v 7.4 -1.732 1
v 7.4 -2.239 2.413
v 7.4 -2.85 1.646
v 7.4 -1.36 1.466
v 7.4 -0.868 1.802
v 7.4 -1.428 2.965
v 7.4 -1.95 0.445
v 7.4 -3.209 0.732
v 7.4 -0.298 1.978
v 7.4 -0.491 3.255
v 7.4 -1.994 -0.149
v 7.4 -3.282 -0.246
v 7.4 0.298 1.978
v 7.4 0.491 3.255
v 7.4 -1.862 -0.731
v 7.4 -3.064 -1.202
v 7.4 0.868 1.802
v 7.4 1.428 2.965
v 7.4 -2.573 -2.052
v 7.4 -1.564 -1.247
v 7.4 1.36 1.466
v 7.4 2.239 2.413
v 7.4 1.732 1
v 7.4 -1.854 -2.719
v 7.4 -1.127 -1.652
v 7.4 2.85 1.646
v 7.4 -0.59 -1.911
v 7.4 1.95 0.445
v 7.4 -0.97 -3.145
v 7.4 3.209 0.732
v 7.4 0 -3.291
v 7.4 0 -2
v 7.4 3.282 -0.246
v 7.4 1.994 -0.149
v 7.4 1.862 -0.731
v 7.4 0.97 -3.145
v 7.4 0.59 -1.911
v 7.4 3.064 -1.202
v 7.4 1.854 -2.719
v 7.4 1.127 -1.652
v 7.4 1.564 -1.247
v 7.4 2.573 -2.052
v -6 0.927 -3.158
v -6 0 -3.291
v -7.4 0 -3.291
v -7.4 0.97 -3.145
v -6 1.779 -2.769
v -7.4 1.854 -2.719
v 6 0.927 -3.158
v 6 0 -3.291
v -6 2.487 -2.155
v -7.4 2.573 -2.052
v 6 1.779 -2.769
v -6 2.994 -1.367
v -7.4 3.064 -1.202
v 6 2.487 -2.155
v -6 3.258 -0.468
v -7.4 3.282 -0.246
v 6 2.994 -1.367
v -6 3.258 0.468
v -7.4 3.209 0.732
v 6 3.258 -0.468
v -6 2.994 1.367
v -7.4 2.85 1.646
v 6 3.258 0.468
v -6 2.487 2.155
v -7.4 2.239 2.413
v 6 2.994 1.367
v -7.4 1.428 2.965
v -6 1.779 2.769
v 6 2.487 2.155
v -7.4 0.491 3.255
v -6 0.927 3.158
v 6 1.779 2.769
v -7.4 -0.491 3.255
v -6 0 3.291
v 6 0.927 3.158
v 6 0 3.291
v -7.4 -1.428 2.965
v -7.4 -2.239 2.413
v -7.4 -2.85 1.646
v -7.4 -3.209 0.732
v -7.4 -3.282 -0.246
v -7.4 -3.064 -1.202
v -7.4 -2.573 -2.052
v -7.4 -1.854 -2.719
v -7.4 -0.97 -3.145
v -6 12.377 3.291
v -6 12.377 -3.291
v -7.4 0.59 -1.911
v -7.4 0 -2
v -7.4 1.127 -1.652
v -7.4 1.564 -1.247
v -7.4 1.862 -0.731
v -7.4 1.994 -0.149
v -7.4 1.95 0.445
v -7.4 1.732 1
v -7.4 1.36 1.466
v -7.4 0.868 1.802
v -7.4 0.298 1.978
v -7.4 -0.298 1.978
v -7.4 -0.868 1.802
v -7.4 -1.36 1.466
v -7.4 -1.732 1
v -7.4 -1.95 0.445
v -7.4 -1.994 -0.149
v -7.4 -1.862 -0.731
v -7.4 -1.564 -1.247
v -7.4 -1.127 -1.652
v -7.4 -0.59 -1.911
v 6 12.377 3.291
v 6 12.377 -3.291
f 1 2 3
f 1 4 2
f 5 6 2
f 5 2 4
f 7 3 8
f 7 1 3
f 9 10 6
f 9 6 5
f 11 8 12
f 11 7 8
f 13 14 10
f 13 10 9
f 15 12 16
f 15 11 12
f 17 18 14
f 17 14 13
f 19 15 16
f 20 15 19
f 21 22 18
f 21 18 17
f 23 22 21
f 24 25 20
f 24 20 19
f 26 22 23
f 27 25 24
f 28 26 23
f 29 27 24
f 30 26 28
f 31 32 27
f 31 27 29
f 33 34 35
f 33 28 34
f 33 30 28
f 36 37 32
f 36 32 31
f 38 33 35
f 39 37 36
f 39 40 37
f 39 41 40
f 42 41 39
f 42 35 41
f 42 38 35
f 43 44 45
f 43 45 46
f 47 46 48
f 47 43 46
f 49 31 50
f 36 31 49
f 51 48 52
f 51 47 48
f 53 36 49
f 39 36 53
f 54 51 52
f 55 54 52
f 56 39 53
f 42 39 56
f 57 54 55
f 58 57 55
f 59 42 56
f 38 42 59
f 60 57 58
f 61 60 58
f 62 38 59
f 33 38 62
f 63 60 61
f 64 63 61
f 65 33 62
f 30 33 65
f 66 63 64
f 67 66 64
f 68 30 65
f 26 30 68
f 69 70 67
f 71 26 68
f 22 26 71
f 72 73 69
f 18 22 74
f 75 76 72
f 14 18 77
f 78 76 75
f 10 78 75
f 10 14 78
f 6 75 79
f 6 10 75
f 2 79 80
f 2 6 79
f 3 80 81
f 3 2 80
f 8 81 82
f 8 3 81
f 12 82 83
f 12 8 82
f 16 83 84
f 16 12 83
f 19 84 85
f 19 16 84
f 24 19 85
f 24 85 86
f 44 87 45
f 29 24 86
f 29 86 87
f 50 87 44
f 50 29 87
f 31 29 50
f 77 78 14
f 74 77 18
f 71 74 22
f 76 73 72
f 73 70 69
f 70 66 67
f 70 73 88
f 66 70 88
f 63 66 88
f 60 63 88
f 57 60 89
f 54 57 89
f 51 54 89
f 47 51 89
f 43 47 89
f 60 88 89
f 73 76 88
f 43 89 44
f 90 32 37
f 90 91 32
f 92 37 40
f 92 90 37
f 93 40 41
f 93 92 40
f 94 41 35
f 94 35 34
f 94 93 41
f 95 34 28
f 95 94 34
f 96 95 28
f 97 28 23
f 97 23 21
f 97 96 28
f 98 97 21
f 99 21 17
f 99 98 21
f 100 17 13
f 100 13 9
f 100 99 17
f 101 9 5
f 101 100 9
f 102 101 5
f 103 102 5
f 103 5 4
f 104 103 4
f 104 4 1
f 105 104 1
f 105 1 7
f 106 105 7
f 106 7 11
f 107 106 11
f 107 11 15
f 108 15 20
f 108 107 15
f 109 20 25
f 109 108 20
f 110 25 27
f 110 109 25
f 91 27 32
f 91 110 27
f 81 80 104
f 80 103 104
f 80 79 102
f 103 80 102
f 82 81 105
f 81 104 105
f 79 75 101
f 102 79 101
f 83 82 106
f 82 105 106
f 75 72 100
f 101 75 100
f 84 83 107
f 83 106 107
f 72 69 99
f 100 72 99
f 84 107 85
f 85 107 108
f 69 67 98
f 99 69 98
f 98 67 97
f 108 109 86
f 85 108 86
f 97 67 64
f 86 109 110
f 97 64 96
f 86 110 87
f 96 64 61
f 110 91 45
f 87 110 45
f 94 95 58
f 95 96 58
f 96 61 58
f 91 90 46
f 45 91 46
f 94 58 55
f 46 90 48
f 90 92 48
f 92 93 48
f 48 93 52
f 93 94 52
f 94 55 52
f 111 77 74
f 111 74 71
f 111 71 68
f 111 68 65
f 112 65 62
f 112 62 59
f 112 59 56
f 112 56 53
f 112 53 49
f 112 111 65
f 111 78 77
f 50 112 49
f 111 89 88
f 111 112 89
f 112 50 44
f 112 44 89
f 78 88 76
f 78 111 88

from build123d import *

# Parameters (mm, degrees)
SKETCH_1_R      = 2
EXTRUDE_1_DEPTH = 7.4
EXTRUDE_2_DEPTH = 6


with BuildPart() as part:
    # 스케치1 → 보스-돌출1 (new, symmetric)
    with BuildSketch(Plane(origin=(0, 0, 0), x_dir=(0, 0, -1), z_dir=(1, 0, 0))):
        with BuildLine():
            ThreePointArc((3.291358074, 0), (0, 3.291358074), (-3.291358074, 0))
            ThreePointArc((-3.291358074, 0), (0, -3.291358074), (3.291358074, 0))
        make_face()
        Circle(SKETCH_1_R, mode=Mode.SUBTRACT)
    extrude(amount=EXTRUDE_1_DEPTH, both=True)

    # 스케치1<3> → 보스-돌출2 (add, symmetric)
    with BuildSketch(Plane(origin=(0, 0, 0), x_dir=(0, 0, -1), z_dir=(1, 0, 0))):
        with BuildLine():
            Line((-3.291358074, 12.376548109), (-3.291358074, 0))
            ThreePointArc((-3.291358074, 0), (0, 3.291358074), (3.291358074, 0))
            Line((3.291358074, 0), (3.291358074, 12.376548109))
            Line((3.291358074, 12.376548109), (-3.291358074, 12.376548109))
        make_face()
    extrude(amount=EXTRUDE_2_DEPTH, both=True)


solid = part.part
